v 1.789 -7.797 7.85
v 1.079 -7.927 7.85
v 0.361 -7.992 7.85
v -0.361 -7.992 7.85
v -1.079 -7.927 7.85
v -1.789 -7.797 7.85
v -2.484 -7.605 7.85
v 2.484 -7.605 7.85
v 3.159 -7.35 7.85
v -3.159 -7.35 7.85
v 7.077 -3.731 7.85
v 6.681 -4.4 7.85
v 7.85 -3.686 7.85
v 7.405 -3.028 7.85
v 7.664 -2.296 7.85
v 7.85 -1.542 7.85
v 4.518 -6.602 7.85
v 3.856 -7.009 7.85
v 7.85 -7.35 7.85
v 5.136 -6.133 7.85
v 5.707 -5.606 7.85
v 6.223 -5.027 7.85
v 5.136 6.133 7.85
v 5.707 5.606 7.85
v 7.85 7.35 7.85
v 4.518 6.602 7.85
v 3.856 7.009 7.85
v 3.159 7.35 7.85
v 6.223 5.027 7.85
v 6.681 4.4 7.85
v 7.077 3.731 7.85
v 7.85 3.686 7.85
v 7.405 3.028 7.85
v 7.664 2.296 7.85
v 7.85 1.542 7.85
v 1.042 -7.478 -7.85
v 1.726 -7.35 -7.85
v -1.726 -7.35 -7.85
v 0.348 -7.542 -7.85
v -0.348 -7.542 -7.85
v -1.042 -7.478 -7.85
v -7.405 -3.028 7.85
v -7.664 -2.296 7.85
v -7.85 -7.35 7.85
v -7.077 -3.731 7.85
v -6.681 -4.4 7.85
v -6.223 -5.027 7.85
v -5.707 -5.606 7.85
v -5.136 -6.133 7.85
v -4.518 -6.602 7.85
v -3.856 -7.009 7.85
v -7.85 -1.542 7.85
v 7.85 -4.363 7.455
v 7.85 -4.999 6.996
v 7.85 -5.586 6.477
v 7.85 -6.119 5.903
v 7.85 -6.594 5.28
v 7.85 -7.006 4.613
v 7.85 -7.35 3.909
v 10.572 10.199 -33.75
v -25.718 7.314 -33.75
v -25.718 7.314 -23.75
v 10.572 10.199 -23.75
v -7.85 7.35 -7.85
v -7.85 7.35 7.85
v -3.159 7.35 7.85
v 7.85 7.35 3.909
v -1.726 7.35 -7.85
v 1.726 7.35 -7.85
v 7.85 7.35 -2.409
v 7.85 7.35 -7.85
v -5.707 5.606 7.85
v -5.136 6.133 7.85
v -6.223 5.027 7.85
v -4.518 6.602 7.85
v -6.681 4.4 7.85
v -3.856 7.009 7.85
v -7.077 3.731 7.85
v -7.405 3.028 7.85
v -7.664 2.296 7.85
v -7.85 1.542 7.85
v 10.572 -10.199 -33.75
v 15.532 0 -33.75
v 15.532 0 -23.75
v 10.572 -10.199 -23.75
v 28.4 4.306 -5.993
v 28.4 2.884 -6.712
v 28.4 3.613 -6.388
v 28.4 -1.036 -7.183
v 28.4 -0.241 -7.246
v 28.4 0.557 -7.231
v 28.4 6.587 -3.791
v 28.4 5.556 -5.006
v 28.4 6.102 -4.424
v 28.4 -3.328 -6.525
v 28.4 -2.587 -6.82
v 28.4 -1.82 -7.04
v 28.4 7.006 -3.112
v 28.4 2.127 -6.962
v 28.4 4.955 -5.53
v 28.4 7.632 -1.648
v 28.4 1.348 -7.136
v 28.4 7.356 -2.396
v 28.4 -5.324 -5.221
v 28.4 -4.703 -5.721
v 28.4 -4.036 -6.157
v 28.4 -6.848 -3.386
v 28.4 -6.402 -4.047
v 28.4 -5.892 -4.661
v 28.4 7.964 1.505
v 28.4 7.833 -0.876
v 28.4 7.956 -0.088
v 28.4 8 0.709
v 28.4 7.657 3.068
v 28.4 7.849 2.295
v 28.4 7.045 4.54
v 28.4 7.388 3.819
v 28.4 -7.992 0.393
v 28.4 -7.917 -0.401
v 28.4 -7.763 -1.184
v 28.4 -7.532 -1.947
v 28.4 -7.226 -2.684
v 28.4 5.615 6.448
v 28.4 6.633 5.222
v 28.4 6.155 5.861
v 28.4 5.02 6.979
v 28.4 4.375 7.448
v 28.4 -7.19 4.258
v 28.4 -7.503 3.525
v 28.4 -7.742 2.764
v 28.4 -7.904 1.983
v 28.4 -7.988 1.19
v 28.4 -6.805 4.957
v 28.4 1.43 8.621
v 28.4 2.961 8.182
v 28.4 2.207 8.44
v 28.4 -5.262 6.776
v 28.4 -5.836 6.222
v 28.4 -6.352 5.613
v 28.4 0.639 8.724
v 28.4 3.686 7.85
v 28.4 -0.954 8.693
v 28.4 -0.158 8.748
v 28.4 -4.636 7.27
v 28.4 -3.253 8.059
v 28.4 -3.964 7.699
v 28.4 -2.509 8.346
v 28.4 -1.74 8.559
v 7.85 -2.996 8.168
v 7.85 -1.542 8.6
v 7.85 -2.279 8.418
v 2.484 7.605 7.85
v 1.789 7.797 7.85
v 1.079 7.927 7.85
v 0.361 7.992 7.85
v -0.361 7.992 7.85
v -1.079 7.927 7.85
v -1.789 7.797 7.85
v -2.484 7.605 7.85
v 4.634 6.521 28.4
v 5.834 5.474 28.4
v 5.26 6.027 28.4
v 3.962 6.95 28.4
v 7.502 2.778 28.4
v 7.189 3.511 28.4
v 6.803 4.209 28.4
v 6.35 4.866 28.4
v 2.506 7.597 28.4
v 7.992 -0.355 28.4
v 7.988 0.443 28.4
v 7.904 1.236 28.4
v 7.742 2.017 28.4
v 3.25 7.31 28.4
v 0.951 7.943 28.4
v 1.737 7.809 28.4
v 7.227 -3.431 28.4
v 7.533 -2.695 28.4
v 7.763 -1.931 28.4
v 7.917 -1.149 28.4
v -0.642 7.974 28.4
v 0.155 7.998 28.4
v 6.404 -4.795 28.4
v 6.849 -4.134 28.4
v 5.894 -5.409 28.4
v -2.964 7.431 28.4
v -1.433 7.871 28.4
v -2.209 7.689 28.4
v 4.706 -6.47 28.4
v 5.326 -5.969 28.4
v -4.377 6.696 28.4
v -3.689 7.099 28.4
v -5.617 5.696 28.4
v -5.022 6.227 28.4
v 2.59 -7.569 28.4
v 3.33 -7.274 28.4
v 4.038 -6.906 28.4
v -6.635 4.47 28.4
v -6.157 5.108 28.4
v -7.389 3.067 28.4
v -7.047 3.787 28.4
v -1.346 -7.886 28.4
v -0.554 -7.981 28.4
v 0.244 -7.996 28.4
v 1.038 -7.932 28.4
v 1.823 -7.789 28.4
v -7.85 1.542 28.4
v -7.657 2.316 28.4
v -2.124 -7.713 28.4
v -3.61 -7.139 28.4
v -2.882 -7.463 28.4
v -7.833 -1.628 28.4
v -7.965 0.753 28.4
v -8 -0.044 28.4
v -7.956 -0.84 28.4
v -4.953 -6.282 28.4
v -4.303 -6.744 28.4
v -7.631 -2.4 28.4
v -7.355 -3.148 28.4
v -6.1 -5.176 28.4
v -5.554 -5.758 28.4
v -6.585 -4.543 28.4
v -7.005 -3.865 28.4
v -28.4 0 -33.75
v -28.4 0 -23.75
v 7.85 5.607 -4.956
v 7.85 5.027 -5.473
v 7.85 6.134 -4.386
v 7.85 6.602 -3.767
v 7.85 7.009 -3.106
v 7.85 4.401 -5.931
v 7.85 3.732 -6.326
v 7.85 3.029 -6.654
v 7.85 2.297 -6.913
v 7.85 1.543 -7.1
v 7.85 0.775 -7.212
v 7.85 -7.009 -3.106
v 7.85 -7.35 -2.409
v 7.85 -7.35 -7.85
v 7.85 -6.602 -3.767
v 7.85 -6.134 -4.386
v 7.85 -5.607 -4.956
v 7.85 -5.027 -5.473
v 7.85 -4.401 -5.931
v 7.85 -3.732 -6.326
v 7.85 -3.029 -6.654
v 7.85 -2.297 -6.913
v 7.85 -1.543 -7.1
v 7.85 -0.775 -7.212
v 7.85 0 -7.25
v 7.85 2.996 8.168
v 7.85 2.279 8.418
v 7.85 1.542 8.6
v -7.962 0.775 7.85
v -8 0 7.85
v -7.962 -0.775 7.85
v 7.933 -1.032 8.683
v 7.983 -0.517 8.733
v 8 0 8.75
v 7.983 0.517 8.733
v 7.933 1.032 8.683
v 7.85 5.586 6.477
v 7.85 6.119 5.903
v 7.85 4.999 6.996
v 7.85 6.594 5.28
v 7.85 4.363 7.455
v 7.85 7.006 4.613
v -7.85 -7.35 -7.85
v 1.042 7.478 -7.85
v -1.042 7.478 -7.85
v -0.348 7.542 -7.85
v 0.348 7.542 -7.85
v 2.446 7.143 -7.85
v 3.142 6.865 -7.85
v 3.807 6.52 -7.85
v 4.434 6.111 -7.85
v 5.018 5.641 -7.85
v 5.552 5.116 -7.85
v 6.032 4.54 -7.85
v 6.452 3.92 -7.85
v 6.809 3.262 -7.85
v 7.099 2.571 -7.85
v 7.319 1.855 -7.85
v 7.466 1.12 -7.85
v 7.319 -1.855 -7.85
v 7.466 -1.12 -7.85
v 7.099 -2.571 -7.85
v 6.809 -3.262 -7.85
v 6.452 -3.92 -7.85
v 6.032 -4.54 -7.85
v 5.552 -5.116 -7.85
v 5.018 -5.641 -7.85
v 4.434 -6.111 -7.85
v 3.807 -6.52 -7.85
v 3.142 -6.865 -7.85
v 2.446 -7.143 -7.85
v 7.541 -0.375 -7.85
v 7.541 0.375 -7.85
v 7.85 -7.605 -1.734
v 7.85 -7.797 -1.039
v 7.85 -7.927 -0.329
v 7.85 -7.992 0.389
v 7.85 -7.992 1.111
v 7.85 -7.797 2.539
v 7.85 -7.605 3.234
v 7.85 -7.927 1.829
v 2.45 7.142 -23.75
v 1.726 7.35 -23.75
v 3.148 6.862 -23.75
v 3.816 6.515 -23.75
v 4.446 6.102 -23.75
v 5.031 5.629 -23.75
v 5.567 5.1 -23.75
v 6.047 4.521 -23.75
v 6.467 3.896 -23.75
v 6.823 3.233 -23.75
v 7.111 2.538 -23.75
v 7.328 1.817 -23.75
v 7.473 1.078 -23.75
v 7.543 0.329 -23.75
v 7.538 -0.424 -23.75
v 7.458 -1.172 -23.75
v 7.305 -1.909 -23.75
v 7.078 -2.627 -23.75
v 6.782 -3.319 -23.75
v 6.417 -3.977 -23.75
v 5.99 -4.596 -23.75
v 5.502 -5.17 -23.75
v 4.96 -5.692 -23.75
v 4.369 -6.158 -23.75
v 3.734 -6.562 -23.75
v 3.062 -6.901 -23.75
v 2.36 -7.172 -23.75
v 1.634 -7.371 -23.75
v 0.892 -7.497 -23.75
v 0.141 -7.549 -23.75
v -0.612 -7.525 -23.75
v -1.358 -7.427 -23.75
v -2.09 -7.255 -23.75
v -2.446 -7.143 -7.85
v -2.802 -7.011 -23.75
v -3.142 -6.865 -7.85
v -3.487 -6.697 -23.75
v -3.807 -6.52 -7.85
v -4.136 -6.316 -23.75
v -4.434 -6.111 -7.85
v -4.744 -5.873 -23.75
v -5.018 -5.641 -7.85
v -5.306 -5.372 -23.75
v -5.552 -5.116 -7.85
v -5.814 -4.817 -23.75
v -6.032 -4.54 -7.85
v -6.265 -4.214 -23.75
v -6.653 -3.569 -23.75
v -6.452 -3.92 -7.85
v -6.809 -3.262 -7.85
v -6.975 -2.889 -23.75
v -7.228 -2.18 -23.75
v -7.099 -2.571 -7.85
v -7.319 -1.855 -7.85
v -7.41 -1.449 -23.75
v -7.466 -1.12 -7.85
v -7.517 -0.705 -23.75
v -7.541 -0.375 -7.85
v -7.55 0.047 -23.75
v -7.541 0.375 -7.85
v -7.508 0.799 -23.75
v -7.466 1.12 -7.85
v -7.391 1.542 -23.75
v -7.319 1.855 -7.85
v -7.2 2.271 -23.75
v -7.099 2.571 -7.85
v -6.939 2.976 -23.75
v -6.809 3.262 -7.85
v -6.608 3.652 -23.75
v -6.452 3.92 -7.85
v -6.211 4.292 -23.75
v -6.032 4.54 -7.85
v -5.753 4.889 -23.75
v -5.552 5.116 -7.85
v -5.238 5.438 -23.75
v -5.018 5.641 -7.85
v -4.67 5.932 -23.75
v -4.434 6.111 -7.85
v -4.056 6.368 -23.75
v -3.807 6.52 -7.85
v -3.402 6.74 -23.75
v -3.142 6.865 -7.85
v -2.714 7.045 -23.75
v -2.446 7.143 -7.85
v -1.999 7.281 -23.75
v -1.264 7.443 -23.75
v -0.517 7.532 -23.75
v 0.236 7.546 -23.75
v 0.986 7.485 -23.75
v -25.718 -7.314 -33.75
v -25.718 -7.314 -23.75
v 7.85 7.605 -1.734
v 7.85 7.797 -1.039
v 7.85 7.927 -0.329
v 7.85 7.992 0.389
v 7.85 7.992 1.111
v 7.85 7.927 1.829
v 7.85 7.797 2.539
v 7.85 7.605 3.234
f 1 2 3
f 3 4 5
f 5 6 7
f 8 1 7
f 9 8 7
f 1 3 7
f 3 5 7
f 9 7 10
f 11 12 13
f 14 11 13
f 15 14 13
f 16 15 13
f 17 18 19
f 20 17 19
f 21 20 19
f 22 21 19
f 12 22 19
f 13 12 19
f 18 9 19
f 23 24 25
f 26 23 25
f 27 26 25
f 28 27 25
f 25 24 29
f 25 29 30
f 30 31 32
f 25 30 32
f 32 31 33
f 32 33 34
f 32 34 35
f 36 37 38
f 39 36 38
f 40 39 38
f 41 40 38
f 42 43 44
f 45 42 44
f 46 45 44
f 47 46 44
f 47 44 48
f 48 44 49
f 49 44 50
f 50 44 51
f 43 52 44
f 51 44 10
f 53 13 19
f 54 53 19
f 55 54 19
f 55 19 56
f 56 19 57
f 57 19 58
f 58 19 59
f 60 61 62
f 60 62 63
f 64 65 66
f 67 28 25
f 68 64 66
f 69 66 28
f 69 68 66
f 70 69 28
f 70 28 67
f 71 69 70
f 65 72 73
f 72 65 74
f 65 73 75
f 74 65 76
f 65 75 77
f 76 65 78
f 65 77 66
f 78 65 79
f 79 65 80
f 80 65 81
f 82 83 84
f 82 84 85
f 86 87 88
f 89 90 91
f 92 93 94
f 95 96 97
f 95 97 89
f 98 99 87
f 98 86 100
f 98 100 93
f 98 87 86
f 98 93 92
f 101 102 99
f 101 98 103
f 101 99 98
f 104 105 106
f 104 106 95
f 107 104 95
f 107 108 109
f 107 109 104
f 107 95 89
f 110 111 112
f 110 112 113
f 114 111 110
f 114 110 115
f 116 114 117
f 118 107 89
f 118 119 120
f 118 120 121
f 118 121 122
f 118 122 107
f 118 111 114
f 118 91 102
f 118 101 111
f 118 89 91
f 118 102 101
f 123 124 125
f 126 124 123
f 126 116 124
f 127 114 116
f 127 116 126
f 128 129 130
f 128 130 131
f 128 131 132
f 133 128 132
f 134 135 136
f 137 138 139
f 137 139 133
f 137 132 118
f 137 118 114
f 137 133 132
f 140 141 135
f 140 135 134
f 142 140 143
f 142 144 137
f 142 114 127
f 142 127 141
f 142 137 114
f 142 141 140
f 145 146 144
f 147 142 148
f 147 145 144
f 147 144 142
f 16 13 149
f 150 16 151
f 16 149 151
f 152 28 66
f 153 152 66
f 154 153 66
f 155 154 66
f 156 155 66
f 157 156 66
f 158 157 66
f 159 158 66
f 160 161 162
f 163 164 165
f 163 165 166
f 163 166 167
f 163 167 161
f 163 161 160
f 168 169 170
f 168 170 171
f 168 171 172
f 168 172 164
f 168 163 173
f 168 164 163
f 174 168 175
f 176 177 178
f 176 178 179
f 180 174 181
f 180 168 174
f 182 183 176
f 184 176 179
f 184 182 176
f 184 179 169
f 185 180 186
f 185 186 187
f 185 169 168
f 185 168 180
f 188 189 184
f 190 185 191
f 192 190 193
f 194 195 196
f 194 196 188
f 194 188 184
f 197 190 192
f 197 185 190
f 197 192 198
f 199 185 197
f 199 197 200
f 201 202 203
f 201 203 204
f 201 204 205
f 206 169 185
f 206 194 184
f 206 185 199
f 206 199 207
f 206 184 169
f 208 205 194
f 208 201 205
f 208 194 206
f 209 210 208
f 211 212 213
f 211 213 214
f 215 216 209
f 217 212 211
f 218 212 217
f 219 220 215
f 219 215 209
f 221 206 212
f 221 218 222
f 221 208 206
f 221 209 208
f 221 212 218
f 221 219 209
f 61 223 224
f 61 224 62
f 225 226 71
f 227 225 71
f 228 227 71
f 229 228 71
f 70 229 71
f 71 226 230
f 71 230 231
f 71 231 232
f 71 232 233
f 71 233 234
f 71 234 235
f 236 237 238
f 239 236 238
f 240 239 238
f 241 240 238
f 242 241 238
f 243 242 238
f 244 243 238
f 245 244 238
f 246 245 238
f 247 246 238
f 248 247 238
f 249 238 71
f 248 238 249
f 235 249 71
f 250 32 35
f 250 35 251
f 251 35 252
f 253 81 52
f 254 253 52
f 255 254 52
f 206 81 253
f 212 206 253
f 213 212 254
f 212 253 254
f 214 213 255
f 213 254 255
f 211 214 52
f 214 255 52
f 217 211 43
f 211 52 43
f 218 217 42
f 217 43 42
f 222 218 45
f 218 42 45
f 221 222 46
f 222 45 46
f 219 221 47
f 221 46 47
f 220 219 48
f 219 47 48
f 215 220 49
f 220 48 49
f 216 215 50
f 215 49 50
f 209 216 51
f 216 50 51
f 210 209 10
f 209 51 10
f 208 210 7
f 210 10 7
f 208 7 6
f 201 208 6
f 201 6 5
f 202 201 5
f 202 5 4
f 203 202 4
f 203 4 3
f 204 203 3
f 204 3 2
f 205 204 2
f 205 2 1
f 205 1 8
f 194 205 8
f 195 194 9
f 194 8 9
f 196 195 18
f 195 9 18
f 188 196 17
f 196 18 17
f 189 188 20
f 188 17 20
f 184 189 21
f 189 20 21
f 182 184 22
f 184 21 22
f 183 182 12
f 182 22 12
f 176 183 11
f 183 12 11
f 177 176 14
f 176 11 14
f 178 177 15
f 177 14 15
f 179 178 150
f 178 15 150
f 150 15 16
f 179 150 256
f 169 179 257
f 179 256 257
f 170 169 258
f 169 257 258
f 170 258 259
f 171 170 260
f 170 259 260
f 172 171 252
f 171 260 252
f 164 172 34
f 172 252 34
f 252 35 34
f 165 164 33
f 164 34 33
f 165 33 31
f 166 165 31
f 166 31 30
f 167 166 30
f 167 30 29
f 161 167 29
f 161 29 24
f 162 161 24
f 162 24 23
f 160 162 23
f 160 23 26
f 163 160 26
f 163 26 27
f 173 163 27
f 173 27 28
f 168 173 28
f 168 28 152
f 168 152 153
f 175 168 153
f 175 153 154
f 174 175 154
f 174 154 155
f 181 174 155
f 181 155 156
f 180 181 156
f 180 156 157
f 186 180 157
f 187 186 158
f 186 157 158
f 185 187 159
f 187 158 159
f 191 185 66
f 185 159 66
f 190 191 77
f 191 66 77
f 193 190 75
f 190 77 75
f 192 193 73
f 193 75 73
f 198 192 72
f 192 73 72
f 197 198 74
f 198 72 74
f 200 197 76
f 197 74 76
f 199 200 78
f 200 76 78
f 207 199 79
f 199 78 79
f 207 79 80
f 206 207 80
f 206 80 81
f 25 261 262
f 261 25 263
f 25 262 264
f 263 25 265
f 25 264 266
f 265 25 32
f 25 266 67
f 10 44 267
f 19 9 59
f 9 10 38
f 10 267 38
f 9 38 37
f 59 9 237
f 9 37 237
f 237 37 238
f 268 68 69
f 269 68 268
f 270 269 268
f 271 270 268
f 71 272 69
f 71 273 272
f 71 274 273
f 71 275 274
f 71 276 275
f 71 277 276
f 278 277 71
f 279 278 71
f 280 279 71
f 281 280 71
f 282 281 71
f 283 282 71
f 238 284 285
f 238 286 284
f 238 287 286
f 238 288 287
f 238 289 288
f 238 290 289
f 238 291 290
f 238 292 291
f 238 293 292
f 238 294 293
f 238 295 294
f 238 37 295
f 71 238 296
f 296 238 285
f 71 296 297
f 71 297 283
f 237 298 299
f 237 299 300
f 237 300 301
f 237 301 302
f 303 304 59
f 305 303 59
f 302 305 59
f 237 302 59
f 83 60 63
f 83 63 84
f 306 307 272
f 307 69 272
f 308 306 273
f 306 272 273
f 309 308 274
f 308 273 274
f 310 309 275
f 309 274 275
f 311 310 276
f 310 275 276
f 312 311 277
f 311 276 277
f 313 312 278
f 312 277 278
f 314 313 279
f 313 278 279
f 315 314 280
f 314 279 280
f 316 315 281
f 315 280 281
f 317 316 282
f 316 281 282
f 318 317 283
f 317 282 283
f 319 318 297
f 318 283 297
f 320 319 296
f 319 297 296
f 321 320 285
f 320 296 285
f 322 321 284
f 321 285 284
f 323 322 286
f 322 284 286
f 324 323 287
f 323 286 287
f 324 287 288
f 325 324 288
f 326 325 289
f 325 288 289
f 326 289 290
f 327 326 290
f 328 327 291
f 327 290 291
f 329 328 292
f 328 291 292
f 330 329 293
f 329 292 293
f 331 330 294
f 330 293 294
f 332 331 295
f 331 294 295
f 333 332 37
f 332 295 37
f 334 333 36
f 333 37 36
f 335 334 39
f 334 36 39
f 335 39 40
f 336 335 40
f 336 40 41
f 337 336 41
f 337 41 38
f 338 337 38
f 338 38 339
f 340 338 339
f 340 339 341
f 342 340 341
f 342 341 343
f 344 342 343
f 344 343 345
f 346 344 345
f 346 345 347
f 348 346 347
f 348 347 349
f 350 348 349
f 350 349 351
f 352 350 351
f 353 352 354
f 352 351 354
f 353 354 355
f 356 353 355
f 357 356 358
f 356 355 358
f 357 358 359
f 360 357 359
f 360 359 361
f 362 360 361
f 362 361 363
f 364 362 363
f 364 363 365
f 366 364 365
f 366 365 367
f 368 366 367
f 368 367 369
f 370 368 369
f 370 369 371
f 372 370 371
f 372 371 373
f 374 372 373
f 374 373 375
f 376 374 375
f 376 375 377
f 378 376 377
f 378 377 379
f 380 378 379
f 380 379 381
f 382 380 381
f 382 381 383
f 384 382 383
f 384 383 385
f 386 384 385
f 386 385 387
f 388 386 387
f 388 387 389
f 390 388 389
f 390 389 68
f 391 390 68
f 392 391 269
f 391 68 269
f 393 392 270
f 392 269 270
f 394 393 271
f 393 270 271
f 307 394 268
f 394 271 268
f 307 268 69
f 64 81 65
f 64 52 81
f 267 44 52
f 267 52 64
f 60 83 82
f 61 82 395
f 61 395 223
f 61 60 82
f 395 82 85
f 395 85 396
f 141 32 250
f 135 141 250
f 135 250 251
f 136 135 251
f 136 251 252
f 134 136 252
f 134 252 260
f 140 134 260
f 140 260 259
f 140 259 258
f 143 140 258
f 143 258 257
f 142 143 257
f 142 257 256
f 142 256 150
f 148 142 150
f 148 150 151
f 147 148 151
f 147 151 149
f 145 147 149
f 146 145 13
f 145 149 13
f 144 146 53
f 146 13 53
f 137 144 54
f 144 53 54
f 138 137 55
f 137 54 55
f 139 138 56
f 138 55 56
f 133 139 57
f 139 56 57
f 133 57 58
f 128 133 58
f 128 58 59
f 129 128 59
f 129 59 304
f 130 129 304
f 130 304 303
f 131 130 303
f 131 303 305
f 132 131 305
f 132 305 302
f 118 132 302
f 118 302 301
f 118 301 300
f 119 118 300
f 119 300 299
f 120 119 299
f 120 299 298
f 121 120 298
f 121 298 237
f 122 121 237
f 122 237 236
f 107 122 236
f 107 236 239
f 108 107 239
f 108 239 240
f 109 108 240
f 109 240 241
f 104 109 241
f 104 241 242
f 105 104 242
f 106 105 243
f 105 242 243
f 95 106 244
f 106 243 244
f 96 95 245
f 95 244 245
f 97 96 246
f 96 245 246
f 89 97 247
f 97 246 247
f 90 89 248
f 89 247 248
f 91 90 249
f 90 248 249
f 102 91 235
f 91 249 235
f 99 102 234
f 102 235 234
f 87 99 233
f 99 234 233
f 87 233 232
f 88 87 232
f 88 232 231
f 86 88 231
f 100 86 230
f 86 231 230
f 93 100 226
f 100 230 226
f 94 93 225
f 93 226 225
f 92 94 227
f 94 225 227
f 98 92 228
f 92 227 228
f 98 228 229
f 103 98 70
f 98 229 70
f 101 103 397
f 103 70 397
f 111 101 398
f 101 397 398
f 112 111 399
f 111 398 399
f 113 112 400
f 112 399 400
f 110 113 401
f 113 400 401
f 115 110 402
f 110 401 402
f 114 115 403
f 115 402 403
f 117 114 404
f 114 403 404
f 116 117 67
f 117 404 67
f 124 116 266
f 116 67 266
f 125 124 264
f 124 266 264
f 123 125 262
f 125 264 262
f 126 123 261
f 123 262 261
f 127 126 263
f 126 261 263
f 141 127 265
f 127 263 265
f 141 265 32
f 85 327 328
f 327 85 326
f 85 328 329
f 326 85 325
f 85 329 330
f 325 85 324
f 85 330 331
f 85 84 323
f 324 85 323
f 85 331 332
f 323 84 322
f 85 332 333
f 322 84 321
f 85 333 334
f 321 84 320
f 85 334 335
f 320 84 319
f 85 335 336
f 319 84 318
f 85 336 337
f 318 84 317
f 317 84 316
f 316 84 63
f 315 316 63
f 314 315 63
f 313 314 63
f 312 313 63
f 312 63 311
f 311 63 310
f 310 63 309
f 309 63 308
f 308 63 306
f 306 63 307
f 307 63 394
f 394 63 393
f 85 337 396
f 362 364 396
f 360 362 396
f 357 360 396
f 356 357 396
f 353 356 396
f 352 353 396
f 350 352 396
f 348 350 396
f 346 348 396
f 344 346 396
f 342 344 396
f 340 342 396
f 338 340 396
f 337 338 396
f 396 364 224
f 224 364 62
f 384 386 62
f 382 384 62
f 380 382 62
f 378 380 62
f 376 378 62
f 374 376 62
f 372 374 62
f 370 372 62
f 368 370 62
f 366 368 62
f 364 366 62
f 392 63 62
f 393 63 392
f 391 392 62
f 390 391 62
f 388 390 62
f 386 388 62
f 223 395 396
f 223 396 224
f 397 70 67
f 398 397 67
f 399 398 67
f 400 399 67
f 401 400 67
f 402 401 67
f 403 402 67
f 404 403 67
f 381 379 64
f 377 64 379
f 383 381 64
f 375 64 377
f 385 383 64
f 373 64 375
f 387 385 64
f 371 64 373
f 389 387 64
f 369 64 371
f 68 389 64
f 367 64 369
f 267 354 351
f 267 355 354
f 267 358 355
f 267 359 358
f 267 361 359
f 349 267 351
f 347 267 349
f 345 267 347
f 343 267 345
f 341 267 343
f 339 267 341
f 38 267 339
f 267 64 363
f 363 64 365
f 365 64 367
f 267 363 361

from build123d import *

# Parameters (mm, degrees)
BOSS_EXTRUDE2_DEPTH      = 7.35
BOSS_EXTRUDE2_DEPTH_BACK = 7.35
SKETCH2_W                = 15.7
SKETCH2_H                = 15.7
SKETCH3_R                = 8
BOSS_EXTRUDE3_DEPTH      = 20.55
SKETCH4_R                = 7.55
BOSS_EXTRUDE4_DEPTH      = 25.9
BOSS_EXTRUDE5_DEPTH      = 10
SKETCH6_R                = 8
BOSS_EXTRUDE6_DEPTH      = 20.55


with BuildPart() as part:
    # Sketch2 → Boss-Extrude2 (new, two sides: drawn at the far end of the back side and taken through both)
    with BuildSketch(Plane(origin=(0, 0, 0), x_dir=(1, 0, 0), z_dir=(0, 1, 0)).offset(-BOSS_EXTRUDE2_DEPTH_BACK)):
        Rectangle(SKETCH2_W, SKETCH2_H)
    extrude(amount=BOSS_EXTRUDE2_DEPTH + BOSS_EXTRUDE2_DEPTH_BACK)

    # Sketch3 → Boss-Extrude3 (add)
    with BuildSketch(Plane(origin=(7.85, 0, 0), x_dir=(0, 0, -1), z_dir=(1, 0, 0))):
        with Locations((-0.75, 0)):
            Circle(SKETCH3_R)
    extrude(amount=BOSS_EXTRUDE3_DEPTH)

    # Sketch4 → Boss-Extrude4 (add)
    with BuildSketch(Plane(origin=(0, 0, -7.85), x_dir=(-1, 0, 0), z_dir=(0, 0, -1))):
        Circle(SKETCH4_R)
    extrude(amount=BOSS_EXTRUDE4_DEPTH)

    # Sketch5 → Boss-Extrude5 (add)
    with BuildSketch(Plane(origin=(0, 0, -33.75), x_dir=(-1, 0, 0), z_dir=(0, 0, -1))):
        Polygon((-15.532193585, 0), (-10.572107213, -10.198544939), (25.717504309, -7.313596743), (28.4, 0), (25.717504309, 7.313596743), (-10.572107213, 10.198544939), align=None)
    extrude(amount=-BOSS_EXTRUDE5_DEPTH)

    # Sketch6 → Boss-Extrude6 (add)
    with BuildSketch(Plane.XY.offset(7.85)):
        Circle(SKETCH6_R)
    extrude(amount=BOSS_EXTRUDE6_DEPTH)


solid = part.part
